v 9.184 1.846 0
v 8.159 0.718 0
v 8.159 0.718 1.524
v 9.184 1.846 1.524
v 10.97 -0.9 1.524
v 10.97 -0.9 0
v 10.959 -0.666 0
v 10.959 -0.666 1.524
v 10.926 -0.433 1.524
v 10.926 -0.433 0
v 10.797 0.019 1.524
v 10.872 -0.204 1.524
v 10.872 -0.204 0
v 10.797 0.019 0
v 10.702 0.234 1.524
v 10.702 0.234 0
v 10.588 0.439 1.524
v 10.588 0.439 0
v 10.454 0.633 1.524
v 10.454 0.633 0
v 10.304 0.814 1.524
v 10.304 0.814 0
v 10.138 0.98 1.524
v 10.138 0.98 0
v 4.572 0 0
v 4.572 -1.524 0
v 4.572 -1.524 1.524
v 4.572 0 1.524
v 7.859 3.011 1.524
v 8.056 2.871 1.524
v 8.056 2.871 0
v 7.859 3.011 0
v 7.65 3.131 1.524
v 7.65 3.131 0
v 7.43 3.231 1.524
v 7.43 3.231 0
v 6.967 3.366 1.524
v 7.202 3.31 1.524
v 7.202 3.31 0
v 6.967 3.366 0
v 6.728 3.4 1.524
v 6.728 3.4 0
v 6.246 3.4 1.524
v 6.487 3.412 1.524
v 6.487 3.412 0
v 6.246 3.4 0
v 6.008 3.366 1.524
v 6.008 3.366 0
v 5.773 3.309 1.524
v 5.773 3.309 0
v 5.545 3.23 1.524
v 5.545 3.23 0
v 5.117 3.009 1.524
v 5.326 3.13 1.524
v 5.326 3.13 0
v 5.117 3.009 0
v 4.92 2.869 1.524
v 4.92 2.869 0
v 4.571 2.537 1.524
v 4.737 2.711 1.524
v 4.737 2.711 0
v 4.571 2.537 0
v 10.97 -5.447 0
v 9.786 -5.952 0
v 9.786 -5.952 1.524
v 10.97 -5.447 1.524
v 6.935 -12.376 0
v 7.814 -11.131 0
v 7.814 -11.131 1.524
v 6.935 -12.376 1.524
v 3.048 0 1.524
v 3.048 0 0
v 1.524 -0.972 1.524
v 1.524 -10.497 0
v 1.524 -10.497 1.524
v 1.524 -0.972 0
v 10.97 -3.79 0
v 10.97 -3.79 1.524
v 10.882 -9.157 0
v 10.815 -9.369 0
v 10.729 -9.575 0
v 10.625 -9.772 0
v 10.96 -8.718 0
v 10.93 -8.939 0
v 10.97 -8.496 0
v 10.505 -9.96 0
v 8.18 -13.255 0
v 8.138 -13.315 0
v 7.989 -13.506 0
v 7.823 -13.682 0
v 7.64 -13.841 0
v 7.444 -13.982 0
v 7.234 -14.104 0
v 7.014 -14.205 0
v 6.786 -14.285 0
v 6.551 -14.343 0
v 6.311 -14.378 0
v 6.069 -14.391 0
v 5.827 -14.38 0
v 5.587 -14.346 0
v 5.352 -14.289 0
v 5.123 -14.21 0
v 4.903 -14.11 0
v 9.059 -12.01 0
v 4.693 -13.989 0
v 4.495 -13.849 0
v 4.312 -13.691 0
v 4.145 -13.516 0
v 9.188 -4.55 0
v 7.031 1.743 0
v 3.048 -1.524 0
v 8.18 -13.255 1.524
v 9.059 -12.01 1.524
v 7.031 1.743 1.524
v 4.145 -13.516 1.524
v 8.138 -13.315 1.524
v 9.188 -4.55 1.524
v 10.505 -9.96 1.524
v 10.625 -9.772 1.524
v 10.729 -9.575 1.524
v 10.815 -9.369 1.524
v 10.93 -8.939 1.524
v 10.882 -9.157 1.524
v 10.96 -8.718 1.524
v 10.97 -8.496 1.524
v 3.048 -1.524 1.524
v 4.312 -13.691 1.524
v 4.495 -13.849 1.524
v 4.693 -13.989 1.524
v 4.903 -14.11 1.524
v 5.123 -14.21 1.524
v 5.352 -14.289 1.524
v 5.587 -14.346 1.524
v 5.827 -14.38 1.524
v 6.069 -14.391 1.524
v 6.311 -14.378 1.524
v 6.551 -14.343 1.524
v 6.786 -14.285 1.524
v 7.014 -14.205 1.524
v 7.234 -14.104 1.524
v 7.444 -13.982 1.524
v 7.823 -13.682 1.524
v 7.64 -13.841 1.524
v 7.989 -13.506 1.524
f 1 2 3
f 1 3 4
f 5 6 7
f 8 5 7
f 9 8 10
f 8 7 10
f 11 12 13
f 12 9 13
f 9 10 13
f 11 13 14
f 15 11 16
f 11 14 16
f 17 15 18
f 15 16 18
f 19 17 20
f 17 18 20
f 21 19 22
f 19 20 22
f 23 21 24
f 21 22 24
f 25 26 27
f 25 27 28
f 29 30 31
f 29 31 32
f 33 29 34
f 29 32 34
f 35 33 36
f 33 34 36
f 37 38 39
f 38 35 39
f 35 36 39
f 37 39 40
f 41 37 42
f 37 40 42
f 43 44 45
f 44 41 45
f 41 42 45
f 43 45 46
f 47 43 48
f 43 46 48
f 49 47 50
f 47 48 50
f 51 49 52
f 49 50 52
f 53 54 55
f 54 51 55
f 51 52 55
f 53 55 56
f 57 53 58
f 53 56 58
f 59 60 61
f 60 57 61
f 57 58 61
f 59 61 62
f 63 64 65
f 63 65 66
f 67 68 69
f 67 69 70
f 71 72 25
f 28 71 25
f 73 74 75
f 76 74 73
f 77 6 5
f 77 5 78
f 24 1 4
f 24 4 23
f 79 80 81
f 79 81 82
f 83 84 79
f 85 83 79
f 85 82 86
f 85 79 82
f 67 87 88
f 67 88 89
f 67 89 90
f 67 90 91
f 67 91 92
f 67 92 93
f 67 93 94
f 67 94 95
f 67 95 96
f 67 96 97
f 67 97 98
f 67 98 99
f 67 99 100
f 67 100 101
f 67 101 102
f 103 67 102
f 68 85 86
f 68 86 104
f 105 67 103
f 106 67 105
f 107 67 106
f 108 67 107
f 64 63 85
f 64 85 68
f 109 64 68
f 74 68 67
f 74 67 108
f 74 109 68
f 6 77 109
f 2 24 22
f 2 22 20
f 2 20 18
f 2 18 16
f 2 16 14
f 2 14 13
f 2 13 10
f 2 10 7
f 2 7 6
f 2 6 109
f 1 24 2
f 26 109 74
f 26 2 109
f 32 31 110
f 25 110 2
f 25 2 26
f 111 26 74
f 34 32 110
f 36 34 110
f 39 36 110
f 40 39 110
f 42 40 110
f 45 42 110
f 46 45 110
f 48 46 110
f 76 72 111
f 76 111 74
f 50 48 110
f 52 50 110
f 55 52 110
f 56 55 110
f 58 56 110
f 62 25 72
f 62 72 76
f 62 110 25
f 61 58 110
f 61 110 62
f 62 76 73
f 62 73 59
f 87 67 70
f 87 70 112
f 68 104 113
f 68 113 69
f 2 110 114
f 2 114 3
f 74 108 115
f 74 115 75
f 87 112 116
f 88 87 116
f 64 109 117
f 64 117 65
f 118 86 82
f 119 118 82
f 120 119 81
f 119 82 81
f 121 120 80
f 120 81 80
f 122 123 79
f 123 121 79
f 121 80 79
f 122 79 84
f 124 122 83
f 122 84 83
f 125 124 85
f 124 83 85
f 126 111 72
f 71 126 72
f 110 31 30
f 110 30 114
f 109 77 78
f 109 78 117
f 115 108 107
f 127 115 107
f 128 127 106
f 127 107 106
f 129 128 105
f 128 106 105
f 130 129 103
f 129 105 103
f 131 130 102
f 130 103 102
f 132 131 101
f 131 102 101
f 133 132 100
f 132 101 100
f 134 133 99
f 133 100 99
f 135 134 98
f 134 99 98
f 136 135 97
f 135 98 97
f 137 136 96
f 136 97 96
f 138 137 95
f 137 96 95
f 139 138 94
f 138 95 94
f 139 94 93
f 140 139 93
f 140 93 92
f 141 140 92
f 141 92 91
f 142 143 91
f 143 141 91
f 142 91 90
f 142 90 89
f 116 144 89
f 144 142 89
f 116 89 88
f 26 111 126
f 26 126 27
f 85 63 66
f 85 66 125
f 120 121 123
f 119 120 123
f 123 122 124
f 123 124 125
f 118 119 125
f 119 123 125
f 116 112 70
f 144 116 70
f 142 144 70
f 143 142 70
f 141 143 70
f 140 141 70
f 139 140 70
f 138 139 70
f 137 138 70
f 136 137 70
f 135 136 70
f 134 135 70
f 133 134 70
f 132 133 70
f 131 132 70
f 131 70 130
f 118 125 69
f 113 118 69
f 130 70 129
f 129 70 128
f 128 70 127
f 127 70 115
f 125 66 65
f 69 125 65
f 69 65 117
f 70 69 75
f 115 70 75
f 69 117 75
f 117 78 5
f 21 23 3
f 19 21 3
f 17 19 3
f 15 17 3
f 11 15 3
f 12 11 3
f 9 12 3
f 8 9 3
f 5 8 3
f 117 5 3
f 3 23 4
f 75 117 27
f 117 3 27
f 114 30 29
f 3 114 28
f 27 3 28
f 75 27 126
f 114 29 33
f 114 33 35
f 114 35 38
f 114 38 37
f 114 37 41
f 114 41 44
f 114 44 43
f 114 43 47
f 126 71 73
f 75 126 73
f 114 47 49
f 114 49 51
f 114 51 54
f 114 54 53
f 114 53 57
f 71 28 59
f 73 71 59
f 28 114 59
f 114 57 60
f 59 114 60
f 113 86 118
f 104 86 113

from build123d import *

# Parameters (mm, degrees)
SKETCH1_W           = 1.524
SKETCH1_H           = 1.524
BOSS_EXTRUDE1_DEPTH = 1.524
FILLET1_R           = 2.54


with BuildPart() as part:
    # Sketch1 → Boss-Extrude1 (new body)
    with BuildSketch(Plane.XY):
        Polygon((1.524, -10.497308023), (1.524, -0.972308023), (6.269557814, 4.493617922), (8.055541686, 2.871017969), (7.030741716, 1.743028155), (8.158731531, 0.718228185), (9.183531501, 1.846217999), (10.969515373, 0.223618046), (10.969515373, -3.789821466), (9.188202018, -4.549828763), (9.786265437, -5.951576297), (10.969515373, -5.446736099), (10.969515373, -9.301381954), (9.058811588, -12.009667231), (7.813530127, -11.131117242), (6.934980138, -12.376398702), (8.180261599, -13.254948692), (6.269557814, -15.963233969), align=None)
        with Locations((3.81, -0.762)):
            Rectangle(SKETCH1_W, SKETCH1_H, mode=Mode.SUBTRACT)
    extrude(amount=BOSS_EXTRUDE1_DEPTH)

    # Fillet1
    # the kernel refuses this fillet: 2.54 mm, written as the material it takes off along each edge
    with BuildSketch(Plane(origin=(6.269557814, 4.493617922, -6.477892314), x_dir=(-0.6555947155448552, -0.7551129511203344, 0), z_dir=(0, 0, 1))) as fillet1_piece_1:
        with BuildLine():
            CenterArc((2.591156926, 2.54), FILLET1_R, 182.87981761, 87.12018239)
            Line((0.05436465, 2.412387507), (0.003628804, 2.409835257))
            ThreePointArc((0.003628804, 2.409835257), (-0.023604781, 1.207338273), (-0.050787105, 0.001144519))
            Line((-0.050787105, 0.001144519), (0, -0.0508))
            Line((0, -0.0508), (2.591156926, -0.0508))
            Line((2.591156926, -0.0508), (2.591156926, 0))
        make_face()
    extrude(amount=14.479784629, mode=Mode.SUBTRACT)
    with BuildSketch(Plane(origin=(10.969515373, 0.223618046, -2.81023831), x_dir=(-0.7401507968211615, 0.6724409252603532, 0), z_dir=(0, 0, 1))) as fillet1_piece_2:
        with BuildLine():
            CenterArc((FILLET1_R * 0.442557214214, FILLET1_R), FILLET1_R, 222.255737271, 47.744262729)
            Line((-FILLET1_R * 0.297593582607, FILLET1_R * 0.32755907474), (-FILLET1_R * 0.312396598543, FILLET1_R * 0.314110256234))
            Line((-FILLET1_R * 0.312396598543, FILLET1_R * 0.314110256234), (-FILLET1_R * 0.00885114428429, -FILLET1_R * 0.02))
            Line((-FILLET1_R * 0.00885114428429, -FILLET1_R * 0.02), (FILLET1_R * 0.442557214214, -FILLET1_R * 0.02))
            Line((FILLET1_R * 0.442557214214, -FILLET1_R * 0.02), (FILLET1_R * 0.442557214214, 0))
        make_face()
    extrude(amount=7.144476621, mode=Mode.SUBTRACT)
    with BuildSketch(Plane(origin=(10.969515373, -9.301381954, -2.014527057), x_dir=(0, 1, 0), z_dir=(0, 0, 1))) as fillet1_piece_3:
        with BuildLine():
            CenterArc((FILLET1_R * 0.317248355422, FILLET1_R), FILLET1_R, 234.796910959, 35.203089041)
            Line((-FILLET1_R * 0.259228015403, FILLET1_R * 0.182886180584), (-FILLET1_R * 0.270757542819, FILLET1_R * 0.166543904196))
            Line((-FILLET1_R * 0.270757542819, FILLET1_R * 0.166543904196), (-FILLET1_R * 0.00634496710845, -FILLET1_R * 0.02))
            Line((-FILLET1_R * 0.00634496710845, -FILLET1_R * 0.02), (FILLET1_R * 0.317248355422, -FILLET1_R * 0.02))
            Line((FILLET1_R * 0.317248355422, -FILLET1_R * 0.02), (FILLET1_R * 0.317248355422, 0))
        make_face()
    extrude(amount=5.553054114, mode=Mode.SUBTRACT)
    with BuildSketch(Plane(origin=(6.269557814, -15.963233969, -8.10313634), x_dir=(0.5764763708249786, 0.8171138194159133, 0), z_dir=(0, 0, 1))) as fillet1_piece_4:
        with BuildLine():
            CenterArc((FILLET1_R * 1.27608446293, FILLET1_R), FILLET1_R, 166.167848872, 103.832151128)
            Line((FILLET1_R * 0.305084187293, FILLET1_R * 1.23907836523), (FILLET1_R * 0.28566418178, FILLET1_R * 1.24385993254))
            Line((FILLET1_R * 0.28566418178, FILLET1_R * 1.24385993254), (-FILLET1_R * 0.0255216892585, -FILLET1_R * 0.02))
            Line((-FILLET1_R * 0.0255216892585, -FILLET1_R * 0.02), (FILLET1_R * 1.27608446293, -FILLET1_R * 0.02))
            Line((FILLET1_R * 1.27608446293, -FILLET1_R * 0.02), (FILLET1_R * 1.27608446293, 0))
        make_face()
    extrude(amount=17.730272679, mode=Mode.SUBTRACT)


solid = part.part
